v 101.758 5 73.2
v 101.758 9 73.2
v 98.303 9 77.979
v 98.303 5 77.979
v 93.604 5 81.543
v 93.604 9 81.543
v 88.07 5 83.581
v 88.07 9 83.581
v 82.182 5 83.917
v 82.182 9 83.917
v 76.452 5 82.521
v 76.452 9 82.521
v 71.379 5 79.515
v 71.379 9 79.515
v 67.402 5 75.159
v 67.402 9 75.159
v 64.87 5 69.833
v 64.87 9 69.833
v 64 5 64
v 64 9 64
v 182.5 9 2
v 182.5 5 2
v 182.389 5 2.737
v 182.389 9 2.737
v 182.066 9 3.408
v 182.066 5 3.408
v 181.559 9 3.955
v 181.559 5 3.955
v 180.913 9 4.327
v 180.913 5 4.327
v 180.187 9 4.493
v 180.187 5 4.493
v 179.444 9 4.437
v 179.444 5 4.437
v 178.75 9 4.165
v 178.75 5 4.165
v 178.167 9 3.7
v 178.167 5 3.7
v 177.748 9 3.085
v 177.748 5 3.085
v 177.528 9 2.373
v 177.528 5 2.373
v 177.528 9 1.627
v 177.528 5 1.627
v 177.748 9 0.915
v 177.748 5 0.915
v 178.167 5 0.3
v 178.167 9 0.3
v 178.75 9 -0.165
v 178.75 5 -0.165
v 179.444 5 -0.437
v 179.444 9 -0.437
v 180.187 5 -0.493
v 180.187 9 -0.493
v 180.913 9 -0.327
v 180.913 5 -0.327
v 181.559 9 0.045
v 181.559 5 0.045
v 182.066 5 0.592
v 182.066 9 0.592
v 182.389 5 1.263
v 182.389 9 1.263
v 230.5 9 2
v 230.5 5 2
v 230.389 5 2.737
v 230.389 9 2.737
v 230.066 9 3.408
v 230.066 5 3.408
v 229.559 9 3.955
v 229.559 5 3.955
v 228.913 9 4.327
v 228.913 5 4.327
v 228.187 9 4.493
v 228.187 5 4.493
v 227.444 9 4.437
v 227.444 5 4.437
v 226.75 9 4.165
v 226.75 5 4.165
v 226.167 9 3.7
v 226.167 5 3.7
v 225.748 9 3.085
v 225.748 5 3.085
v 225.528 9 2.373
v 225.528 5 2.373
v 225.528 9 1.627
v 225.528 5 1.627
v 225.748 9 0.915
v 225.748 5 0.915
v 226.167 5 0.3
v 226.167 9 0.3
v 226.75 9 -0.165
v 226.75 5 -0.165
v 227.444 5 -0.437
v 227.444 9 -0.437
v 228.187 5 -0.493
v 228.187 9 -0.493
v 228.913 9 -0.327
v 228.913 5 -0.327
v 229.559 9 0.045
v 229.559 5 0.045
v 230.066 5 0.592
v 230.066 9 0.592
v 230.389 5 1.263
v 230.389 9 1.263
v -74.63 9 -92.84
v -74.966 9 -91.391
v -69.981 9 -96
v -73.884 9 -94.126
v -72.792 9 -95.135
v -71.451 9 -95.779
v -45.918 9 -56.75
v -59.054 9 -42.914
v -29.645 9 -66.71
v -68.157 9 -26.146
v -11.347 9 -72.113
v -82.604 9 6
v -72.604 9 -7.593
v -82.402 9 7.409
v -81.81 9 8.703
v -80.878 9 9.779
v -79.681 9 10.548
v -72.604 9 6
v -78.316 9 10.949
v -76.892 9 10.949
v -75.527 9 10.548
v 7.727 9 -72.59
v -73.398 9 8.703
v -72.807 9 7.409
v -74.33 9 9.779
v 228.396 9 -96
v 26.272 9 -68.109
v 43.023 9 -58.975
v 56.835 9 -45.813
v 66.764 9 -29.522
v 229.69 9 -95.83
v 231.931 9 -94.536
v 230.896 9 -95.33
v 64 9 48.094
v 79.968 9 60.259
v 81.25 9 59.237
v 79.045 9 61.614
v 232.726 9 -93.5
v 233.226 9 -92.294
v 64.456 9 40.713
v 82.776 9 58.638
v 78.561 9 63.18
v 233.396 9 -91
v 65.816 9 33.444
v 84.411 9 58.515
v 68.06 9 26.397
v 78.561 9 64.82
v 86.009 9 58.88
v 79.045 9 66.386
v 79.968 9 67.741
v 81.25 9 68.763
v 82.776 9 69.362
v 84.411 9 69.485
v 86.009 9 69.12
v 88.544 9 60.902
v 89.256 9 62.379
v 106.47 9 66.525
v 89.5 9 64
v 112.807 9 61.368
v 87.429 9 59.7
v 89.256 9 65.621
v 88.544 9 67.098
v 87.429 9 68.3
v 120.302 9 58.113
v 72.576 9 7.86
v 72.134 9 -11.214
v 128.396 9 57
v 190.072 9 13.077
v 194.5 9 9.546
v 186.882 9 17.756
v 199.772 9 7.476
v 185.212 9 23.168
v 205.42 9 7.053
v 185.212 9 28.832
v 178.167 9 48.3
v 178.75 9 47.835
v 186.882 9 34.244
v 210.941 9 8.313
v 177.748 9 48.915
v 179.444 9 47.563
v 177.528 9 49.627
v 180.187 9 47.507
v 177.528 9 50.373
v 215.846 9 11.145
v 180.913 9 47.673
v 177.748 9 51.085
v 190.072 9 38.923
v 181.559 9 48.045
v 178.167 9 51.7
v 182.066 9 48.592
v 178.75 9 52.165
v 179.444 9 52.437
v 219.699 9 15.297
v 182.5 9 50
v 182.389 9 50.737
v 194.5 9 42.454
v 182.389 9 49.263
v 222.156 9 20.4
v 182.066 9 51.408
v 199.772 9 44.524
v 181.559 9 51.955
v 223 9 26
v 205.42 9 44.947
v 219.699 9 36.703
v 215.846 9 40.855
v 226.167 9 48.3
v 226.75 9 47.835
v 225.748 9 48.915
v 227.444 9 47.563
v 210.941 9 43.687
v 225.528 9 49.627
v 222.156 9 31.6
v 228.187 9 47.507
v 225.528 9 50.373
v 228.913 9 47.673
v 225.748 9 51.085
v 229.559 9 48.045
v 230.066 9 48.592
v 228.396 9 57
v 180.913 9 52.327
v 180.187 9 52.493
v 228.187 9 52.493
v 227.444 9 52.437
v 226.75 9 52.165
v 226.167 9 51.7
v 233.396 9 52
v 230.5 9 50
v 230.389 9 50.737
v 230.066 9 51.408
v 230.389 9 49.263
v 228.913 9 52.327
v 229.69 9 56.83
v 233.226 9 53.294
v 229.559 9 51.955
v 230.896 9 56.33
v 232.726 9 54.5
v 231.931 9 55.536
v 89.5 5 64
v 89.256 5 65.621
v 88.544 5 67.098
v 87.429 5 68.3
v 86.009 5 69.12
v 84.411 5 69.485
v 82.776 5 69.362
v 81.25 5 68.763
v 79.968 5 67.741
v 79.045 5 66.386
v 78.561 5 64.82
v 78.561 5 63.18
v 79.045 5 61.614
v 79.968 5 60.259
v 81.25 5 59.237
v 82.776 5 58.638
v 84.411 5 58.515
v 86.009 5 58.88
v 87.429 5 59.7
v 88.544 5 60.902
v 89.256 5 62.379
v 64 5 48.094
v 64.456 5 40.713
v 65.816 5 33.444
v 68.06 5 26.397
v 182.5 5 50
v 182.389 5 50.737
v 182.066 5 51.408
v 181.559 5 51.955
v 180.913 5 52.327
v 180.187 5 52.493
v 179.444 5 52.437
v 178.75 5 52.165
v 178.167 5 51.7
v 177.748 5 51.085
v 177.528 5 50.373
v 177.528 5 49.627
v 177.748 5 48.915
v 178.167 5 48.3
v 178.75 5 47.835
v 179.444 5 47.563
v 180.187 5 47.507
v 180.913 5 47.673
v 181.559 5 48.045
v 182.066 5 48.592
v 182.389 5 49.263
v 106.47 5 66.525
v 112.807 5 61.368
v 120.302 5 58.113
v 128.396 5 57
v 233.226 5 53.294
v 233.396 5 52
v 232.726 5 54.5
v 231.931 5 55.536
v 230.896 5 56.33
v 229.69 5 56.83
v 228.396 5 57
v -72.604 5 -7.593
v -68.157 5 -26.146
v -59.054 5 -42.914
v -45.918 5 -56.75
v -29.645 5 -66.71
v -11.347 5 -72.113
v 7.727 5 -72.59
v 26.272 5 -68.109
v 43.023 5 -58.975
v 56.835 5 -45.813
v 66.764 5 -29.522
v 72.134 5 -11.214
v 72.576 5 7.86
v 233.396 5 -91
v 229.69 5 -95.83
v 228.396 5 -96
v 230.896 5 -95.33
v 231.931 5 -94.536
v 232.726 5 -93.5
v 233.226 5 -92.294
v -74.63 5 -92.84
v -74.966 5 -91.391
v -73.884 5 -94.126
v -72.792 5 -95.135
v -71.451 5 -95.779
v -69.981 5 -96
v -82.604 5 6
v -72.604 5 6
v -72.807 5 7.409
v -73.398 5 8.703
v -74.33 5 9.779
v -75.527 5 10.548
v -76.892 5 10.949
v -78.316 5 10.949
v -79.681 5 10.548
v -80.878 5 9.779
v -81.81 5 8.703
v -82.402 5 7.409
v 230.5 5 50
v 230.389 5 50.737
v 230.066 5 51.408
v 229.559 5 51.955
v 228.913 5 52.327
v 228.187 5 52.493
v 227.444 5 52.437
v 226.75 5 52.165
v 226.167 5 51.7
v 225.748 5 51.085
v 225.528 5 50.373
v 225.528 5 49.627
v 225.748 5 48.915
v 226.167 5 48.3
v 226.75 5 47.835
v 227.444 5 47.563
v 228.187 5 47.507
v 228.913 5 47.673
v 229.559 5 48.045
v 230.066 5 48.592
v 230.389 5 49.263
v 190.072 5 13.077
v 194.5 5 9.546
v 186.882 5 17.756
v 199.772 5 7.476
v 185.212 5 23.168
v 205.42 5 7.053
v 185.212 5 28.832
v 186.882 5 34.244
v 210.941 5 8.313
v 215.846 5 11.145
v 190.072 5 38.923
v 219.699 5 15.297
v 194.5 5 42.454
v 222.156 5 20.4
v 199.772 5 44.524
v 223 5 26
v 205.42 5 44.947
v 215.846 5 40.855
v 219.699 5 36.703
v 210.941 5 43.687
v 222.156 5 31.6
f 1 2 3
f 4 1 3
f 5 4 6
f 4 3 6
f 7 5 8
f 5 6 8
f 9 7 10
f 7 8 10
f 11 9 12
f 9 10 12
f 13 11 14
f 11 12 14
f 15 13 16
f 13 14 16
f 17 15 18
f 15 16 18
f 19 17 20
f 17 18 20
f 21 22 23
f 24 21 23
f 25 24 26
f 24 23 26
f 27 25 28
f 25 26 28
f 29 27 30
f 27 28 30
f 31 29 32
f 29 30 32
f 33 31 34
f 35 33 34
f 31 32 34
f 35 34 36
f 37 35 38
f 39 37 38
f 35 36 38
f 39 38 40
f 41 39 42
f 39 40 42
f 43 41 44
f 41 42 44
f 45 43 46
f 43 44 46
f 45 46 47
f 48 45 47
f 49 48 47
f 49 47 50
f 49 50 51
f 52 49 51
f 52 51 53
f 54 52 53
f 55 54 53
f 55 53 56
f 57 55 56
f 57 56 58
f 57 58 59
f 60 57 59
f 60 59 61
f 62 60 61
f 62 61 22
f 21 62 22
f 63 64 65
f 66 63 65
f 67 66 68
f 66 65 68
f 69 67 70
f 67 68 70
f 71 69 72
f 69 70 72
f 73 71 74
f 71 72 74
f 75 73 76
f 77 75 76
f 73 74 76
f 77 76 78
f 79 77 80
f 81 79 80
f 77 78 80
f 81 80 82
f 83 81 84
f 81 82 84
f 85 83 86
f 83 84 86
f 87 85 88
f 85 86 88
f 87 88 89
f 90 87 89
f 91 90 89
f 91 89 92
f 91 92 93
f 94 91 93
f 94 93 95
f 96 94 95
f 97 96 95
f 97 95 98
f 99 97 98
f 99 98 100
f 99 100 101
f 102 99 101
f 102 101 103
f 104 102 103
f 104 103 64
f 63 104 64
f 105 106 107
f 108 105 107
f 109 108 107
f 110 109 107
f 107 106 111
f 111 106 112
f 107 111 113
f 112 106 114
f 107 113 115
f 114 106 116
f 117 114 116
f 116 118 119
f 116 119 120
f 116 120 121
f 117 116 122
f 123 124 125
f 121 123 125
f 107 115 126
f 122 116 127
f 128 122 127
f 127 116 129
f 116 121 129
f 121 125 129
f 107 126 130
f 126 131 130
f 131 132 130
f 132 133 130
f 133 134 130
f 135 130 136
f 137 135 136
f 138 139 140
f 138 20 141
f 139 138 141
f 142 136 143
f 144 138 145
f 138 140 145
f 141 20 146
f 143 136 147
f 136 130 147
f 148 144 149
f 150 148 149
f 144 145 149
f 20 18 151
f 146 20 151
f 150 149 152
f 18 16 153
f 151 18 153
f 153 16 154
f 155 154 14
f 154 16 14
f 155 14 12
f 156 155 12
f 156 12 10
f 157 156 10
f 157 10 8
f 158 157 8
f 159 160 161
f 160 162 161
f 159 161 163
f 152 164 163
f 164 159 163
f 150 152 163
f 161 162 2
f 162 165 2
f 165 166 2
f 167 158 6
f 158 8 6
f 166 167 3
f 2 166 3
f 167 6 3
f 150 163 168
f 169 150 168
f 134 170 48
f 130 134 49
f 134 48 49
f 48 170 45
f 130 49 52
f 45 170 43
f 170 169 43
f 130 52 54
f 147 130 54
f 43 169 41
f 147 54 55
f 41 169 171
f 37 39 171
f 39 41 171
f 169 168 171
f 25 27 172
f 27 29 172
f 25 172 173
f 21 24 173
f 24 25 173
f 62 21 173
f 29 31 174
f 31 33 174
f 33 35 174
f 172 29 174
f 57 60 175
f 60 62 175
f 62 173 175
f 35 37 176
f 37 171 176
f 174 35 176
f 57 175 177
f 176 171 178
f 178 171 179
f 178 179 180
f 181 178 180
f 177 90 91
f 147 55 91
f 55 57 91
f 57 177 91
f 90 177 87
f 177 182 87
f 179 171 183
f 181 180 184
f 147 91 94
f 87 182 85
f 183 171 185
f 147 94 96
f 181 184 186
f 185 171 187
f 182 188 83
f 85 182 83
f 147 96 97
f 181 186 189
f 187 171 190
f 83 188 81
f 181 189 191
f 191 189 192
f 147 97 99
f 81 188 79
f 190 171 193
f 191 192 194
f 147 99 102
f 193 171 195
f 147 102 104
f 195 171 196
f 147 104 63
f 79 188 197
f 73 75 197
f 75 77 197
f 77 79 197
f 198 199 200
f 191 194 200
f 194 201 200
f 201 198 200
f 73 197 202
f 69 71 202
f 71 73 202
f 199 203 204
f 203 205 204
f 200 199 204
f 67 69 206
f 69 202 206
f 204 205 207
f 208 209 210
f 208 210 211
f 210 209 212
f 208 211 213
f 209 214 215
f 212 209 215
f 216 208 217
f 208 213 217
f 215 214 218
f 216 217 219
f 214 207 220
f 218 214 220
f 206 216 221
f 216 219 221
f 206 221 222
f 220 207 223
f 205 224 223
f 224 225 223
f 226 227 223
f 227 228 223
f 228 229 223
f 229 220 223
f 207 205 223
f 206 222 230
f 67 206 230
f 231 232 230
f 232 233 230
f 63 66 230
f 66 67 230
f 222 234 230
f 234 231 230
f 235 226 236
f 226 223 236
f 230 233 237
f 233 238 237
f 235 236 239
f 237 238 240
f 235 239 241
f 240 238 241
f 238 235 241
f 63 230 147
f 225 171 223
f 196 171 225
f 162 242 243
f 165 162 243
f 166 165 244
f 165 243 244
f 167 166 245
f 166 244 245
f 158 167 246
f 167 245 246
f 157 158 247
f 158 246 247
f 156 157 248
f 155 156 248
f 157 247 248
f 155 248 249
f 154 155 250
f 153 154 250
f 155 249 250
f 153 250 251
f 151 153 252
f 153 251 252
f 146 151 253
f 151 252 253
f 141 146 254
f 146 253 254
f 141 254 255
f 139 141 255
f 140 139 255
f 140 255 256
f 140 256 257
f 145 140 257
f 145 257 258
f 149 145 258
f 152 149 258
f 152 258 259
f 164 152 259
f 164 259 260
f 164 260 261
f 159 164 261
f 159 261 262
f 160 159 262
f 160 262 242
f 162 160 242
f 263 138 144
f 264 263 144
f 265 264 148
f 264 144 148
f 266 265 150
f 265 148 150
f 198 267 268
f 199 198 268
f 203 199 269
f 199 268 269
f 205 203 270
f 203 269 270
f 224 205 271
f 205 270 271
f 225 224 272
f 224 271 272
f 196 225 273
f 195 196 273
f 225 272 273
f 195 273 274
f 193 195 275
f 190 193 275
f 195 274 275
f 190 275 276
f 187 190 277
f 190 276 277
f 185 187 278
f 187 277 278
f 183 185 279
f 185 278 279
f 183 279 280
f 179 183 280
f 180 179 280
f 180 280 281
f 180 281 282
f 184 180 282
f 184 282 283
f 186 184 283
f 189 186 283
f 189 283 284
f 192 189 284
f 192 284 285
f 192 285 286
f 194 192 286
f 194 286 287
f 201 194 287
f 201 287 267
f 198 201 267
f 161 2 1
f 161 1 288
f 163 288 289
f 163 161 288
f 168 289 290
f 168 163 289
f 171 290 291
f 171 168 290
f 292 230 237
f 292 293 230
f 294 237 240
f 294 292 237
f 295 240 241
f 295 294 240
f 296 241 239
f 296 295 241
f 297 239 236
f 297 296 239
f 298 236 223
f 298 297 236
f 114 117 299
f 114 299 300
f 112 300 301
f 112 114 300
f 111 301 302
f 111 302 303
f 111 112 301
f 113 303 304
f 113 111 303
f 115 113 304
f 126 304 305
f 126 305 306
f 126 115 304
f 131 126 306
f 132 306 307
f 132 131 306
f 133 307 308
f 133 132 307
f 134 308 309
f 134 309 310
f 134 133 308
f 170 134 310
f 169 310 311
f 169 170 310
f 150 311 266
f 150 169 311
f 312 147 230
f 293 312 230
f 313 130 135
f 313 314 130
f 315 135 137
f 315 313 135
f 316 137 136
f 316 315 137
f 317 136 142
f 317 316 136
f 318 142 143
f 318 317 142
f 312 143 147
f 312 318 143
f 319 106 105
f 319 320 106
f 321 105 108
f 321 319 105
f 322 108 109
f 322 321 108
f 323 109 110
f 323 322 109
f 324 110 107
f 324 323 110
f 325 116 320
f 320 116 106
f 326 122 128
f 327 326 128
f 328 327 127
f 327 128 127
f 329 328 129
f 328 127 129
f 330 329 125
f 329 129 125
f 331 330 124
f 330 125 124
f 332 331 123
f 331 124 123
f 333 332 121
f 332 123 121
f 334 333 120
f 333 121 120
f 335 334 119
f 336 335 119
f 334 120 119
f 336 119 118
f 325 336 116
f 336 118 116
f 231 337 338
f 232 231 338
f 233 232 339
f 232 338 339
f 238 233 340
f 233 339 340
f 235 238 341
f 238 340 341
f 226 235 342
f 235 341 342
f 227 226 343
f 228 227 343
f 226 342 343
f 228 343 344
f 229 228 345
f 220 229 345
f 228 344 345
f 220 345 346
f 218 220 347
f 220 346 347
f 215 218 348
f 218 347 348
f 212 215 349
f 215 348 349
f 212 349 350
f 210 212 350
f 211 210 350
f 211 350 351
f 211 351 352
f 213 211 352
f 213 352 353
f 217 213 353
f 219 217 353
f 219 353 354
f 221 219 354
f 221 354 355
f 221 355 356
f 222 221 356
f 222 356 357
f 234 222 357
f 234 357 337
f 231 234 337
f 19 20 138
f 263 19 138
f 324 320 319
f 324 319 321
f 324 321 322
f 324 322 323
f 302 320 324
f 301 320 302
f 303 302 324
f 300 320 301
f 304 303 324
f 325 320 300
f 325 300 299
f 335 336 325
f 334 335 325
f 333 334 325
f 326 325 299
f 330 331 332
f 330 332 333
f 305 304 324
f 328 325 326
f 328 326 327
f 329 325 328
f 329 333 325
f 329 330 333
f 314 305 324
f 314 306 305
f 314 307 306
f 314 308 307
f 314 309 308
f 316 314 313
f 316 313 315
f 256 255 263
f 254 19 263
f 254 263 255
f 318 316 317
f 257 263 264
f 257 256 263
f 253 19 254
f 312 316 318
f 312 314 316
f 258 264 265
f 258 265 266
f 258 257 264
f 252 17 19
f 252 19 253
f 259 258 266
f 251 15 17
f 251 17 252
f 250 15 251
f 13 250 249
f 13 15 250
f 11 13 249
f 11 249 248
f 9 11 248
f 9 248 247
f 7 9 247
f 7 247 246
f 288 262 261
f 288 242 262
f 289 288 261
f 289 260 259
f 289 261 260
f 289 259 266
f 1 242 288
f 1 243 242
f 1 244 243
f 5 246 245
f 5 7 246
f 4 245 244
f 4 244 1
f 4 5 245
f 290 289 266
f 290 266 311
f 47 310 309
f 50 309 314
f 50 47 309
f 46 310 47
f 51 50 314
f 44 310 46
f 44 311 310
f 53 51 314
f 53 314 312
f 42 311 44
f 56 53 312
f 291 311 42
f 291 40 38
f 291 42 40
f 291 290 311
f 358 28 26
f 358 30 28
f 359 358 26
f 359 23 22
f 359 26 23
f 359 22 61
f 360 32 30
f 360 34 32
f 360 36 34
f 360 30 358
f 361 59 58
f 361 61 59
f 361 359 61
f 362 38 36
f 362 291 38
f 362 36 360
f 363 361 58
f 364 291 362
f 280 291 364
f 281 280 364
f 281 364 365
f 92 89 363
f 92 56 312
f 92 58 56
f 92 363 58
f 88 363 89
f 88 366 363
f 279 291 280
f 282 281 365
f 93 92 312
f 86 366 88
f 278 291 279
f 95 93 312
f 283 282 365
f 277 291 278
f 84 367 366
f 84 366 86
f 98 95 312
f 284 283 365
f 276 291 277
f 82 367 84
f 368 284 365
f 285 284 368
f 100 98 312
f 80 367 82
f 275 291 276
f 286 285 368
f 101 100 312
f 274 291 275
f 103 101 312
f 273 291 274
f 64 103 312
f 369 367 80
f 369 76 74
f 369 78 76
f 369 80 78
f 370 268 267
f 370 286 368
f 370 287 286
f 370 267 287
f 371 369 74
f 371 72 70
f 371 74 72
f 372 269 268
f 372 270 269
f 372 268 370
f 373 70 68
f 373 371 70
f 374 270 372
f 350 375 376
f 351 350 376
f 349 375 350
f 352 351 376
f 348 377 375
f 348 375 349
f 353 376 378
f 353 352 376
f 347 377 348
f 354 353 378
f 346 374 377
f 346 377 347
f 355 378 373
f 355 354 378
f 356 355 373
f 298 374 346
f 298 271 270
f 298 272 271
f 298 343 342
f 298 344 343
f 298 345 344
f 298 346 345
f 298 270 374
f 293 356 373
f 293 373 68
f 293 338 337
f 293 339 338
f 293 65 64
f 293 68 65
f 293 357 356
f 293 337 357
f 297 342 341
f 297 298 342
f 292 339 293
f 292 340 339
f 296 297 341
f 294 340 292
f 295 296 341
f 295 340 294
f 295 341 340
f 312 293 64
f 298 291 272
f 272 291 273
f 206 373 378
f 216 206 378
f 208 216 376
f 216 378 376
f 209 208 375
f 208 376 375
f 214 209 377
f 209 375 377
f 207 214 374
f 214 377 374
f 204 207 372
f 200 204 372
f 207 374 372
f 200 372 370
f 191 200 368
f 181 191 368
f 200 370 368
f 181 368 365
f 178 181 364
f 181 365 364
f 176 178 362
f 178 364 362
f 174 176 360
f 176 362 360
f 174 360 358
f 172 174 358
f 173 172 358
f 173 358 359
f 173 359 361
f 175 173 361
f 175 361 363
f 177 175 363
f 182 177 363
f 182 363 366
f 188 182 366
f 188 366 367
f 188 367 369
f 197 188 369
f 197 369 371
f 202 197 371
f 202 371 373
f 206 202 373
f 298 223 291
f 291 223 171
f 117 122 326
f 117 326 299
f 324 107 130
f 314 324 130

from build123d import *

# Parameters (mm, degrees)
PAD_DEPTH     = 4
SKETCH002_R   = 19
SKETCH002_R_2 = 2.5
SKETCH002_R_3 = 5.5
POCKET_DEPTH  = 4.001
FILLET001_R   = 5


with BuildPart() as part:
    # Sketch001 → Pad (new body)
    with BuildSketch(Plane.XZ):
        with BuildLine():
            Line((-82.604054, 6), (-74.604054, -96))
            Line((-74.604054, -96), (233.395946, -96))
            Line((233.395946, -96), (233.395946, 57))
            Line((233.395946, 57), (128.395946, 57))
            ThreePointArc((101.758378, 73.2), (112.807488, 61.367989), (128.395946, 57))
            ThreePointArc((101.758378, 73.2), (79.265423, 83.431515), (64, 64))
            Line((64, 64), (64, 48.093659))
            ThreePointArc((64, 48.093659), (65.023772, 37.057151), (68.06015, 26.397271))
            ThreePointArc((-72.604054, -7.592846), (17.146247, -70.957778), (68.06015, 26.397271))
            Line((-72.604054, 6), (-72.604054, -7.592846))
            ThreePointArc((-72.604054, 6), (-77.604054, 11), (-82.604054, 6))
        make_face()
    extrude(amount=PAD_DEPTH)

    # Sketch002 → Pocket (cut, through all)
    with BuildSketch(Plane.XZ.offset(4)):
        with Locations((204, 26)):
            Circle(SKETCH002_R)
        with Locations((180, 50)):
            Circle(SKETCH002_R_2)
        with Locations((228, 50)):
            Circle(SKETCH002_R_2)
        with Locations((228, 2)):
            Circle(SKETCH002_R_2)
        with Locations((180, 2)):
            Circle(SKETCH002_R_2)
        with Locations((84, 64)):
            Circle(SKETCH002_R_3)
    extrude(amount=-POCKET_DEPTH, mode=Mode.SUBTRACT)

    # Fillet001
    fillet001_edges = [part.edges().sort_by_distance(p)[0] for p in [
        (233.395946, -2, 57),
        (233.395946, -2, -96),
        (-74.604054, -2, -96),
    ]]
    fillet(fillet001_edges, radius=FILLET001_R)


with BuildPart() as part_1:
    # Body004 placement: moved
    add(part.part.moved(Location((0, 9, 0))))


solid = part_1.part
